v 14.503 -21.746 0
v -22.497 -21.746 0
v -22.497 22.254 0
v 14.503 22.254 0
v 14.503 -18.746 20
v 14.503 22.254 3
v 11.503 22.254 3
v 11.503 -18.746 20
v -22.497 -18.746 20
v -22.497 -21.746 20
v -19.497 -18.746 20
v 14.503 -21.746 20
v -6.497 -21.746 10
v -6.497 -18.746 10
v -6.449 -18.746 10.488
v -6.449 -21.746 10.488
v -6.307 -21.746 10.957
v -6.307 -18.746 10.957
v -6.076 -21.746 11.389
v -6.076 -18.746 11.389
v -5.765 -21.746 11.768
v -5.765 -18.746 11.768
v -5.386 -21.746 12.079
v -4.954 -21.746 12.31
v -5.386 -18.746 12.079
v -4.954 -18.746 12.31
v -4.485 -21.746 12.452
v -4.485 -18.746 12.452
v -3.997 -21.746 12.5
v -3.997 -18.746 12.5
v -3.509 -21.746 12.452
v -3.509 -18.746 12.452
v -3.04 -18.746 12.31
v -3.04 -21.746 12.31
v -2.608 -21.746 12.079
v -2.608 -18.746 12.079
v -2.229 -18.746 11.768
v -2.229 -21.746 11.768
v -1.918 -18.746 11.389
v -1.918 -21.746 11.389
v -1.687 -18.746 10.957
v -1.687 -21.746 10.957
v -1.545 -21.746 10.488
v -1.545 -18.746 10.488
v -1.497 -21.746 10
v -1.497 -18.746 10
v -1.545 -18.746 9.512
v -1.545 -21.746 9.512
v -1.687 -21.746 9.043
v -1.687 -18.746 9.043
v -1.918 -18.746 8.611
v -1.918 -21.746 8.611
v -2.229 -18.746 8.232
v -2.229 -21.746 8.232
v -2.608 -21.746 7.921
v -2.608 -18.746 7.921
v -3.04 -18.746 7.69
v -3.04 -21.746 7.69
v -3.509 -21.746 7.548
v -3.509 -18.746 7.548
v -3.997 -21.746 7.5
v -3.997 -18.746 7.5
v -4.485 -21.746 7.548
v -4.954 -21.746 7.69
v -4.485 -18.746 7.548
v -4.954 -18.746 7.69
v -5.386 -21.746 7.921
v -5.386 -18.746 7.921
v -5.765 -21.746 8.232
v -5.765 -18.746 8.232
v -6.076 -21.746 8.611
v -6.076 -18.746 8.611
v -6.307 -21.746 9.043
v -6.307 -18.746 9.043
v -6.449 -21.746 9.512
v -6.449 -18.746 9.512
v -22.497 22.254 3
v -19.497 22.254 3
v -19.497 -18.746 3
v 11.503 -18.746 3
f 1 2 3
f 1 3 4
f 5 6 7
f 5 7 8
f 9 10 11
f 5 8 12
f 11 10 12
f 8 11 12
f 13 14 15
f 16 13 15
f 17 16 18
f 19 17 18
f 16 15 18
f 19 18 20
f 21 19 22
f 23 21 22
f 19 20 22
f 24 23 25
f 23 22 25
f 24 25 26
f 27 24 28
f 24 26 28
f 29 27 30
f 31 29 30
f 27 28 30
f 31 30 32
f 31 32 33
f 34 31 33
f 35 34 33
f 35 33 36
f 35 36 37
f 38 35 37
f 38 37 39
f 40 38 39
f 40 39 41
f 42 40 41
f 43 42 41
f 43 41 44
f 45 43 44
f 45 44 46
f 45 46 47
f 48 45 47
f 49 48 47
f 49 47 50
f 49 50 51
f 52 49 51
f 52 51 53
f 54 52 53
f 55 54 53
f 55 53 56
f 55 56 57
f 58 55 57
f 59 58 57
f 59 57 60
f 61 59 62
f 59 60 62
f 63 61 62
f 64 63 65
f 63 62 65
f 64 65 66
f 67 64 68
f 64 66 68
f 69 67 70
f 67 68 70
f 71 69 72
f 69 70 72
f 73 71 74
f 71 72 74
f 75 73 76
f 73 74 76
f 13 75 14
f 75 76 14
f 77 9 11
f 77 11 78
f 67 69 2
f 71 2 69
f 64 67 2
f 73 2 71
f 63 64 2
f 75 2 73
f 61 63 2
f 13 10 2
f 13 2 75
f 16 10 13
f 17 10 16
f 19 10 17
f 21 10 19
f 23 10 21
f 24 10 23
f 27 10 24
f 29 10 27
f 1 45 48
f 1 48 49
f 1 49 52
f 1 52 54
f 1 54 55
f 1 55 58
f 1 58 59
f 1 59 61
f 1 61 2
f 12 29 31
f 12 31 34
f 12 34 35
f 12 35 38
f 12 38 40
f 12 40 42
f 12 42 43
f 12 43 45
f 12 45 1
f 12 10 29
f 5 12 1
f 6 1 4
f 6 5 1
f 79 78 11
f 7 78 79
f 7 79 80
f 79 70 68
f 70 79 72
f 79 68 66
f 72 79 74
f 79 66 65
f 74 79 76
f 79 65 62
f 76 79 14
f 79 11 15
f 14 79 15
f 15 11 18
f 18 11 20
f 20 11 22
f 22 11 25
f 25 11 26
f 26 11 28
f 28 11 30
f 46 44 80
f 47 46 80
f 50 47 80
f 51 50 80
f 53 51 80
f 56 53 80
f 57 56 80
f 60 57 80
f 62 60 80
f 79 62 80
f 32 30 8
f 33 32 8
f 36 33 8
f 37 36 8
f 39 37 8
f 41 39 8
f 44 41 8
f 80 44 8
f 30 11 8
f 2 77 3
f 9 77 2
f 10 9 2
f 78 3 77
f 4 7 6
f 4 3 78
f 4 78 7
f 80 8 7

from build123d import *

# Parameters (mm, degrees)
F0_W     = 37
F0_H     = 44
F1_DEPTH = 3
F2_W     = 37
F2_H     = 17
F3_DEPTH = 3
F5_DEPTH = 3
F7_DEPTH = 3
F9_D     = 5


with BuildPart() as f1:
    # F0 (on Top) → F1 (new body)
    with BuildSketch(Plane.XY):
        with Locations((-3.996914, 0.254389)):
            Rectangle(F0_W, F0_H)
    extrude(amount=F1_DEPTH)

    # F2 (on face) → F3 (join)
    with BuildSketch(Plane.XZ.offset(21.745611)):
        with Locations((-3.996914, 11.5)):
            Rectangle(F2_W, F2_H)
    extrude(amount=-F3_DEPTH)

    # F4 (on face) → F5 (join)
    with BuildSketch(Plane.YZ.offset(14.503086)):
        Polygon((22.254389, 3), (-18.745611, 20), (-18.745611, 3), align=None)
    extrude(amount=-F5_DEPTH)

    # F6 (on face) → F7 (join)
    with BuildSketch(Plane(origin=(-22.496914, 0, 0), x_dir=(0, -1, 0), z_dir=(-1, 0, 0))):
        Polygon((18.745611, 3), (18.745611, 20), (-22.254389, 3), align=None)
    extrude(amount=-F7_DEPTH)

    # F9 (through all)
    with Locations(Plane.XZ.offset(21.745611)):
        with Locations((-3.996914, 10)):
            Hole(F9_D / 2)


solid = f1.part
